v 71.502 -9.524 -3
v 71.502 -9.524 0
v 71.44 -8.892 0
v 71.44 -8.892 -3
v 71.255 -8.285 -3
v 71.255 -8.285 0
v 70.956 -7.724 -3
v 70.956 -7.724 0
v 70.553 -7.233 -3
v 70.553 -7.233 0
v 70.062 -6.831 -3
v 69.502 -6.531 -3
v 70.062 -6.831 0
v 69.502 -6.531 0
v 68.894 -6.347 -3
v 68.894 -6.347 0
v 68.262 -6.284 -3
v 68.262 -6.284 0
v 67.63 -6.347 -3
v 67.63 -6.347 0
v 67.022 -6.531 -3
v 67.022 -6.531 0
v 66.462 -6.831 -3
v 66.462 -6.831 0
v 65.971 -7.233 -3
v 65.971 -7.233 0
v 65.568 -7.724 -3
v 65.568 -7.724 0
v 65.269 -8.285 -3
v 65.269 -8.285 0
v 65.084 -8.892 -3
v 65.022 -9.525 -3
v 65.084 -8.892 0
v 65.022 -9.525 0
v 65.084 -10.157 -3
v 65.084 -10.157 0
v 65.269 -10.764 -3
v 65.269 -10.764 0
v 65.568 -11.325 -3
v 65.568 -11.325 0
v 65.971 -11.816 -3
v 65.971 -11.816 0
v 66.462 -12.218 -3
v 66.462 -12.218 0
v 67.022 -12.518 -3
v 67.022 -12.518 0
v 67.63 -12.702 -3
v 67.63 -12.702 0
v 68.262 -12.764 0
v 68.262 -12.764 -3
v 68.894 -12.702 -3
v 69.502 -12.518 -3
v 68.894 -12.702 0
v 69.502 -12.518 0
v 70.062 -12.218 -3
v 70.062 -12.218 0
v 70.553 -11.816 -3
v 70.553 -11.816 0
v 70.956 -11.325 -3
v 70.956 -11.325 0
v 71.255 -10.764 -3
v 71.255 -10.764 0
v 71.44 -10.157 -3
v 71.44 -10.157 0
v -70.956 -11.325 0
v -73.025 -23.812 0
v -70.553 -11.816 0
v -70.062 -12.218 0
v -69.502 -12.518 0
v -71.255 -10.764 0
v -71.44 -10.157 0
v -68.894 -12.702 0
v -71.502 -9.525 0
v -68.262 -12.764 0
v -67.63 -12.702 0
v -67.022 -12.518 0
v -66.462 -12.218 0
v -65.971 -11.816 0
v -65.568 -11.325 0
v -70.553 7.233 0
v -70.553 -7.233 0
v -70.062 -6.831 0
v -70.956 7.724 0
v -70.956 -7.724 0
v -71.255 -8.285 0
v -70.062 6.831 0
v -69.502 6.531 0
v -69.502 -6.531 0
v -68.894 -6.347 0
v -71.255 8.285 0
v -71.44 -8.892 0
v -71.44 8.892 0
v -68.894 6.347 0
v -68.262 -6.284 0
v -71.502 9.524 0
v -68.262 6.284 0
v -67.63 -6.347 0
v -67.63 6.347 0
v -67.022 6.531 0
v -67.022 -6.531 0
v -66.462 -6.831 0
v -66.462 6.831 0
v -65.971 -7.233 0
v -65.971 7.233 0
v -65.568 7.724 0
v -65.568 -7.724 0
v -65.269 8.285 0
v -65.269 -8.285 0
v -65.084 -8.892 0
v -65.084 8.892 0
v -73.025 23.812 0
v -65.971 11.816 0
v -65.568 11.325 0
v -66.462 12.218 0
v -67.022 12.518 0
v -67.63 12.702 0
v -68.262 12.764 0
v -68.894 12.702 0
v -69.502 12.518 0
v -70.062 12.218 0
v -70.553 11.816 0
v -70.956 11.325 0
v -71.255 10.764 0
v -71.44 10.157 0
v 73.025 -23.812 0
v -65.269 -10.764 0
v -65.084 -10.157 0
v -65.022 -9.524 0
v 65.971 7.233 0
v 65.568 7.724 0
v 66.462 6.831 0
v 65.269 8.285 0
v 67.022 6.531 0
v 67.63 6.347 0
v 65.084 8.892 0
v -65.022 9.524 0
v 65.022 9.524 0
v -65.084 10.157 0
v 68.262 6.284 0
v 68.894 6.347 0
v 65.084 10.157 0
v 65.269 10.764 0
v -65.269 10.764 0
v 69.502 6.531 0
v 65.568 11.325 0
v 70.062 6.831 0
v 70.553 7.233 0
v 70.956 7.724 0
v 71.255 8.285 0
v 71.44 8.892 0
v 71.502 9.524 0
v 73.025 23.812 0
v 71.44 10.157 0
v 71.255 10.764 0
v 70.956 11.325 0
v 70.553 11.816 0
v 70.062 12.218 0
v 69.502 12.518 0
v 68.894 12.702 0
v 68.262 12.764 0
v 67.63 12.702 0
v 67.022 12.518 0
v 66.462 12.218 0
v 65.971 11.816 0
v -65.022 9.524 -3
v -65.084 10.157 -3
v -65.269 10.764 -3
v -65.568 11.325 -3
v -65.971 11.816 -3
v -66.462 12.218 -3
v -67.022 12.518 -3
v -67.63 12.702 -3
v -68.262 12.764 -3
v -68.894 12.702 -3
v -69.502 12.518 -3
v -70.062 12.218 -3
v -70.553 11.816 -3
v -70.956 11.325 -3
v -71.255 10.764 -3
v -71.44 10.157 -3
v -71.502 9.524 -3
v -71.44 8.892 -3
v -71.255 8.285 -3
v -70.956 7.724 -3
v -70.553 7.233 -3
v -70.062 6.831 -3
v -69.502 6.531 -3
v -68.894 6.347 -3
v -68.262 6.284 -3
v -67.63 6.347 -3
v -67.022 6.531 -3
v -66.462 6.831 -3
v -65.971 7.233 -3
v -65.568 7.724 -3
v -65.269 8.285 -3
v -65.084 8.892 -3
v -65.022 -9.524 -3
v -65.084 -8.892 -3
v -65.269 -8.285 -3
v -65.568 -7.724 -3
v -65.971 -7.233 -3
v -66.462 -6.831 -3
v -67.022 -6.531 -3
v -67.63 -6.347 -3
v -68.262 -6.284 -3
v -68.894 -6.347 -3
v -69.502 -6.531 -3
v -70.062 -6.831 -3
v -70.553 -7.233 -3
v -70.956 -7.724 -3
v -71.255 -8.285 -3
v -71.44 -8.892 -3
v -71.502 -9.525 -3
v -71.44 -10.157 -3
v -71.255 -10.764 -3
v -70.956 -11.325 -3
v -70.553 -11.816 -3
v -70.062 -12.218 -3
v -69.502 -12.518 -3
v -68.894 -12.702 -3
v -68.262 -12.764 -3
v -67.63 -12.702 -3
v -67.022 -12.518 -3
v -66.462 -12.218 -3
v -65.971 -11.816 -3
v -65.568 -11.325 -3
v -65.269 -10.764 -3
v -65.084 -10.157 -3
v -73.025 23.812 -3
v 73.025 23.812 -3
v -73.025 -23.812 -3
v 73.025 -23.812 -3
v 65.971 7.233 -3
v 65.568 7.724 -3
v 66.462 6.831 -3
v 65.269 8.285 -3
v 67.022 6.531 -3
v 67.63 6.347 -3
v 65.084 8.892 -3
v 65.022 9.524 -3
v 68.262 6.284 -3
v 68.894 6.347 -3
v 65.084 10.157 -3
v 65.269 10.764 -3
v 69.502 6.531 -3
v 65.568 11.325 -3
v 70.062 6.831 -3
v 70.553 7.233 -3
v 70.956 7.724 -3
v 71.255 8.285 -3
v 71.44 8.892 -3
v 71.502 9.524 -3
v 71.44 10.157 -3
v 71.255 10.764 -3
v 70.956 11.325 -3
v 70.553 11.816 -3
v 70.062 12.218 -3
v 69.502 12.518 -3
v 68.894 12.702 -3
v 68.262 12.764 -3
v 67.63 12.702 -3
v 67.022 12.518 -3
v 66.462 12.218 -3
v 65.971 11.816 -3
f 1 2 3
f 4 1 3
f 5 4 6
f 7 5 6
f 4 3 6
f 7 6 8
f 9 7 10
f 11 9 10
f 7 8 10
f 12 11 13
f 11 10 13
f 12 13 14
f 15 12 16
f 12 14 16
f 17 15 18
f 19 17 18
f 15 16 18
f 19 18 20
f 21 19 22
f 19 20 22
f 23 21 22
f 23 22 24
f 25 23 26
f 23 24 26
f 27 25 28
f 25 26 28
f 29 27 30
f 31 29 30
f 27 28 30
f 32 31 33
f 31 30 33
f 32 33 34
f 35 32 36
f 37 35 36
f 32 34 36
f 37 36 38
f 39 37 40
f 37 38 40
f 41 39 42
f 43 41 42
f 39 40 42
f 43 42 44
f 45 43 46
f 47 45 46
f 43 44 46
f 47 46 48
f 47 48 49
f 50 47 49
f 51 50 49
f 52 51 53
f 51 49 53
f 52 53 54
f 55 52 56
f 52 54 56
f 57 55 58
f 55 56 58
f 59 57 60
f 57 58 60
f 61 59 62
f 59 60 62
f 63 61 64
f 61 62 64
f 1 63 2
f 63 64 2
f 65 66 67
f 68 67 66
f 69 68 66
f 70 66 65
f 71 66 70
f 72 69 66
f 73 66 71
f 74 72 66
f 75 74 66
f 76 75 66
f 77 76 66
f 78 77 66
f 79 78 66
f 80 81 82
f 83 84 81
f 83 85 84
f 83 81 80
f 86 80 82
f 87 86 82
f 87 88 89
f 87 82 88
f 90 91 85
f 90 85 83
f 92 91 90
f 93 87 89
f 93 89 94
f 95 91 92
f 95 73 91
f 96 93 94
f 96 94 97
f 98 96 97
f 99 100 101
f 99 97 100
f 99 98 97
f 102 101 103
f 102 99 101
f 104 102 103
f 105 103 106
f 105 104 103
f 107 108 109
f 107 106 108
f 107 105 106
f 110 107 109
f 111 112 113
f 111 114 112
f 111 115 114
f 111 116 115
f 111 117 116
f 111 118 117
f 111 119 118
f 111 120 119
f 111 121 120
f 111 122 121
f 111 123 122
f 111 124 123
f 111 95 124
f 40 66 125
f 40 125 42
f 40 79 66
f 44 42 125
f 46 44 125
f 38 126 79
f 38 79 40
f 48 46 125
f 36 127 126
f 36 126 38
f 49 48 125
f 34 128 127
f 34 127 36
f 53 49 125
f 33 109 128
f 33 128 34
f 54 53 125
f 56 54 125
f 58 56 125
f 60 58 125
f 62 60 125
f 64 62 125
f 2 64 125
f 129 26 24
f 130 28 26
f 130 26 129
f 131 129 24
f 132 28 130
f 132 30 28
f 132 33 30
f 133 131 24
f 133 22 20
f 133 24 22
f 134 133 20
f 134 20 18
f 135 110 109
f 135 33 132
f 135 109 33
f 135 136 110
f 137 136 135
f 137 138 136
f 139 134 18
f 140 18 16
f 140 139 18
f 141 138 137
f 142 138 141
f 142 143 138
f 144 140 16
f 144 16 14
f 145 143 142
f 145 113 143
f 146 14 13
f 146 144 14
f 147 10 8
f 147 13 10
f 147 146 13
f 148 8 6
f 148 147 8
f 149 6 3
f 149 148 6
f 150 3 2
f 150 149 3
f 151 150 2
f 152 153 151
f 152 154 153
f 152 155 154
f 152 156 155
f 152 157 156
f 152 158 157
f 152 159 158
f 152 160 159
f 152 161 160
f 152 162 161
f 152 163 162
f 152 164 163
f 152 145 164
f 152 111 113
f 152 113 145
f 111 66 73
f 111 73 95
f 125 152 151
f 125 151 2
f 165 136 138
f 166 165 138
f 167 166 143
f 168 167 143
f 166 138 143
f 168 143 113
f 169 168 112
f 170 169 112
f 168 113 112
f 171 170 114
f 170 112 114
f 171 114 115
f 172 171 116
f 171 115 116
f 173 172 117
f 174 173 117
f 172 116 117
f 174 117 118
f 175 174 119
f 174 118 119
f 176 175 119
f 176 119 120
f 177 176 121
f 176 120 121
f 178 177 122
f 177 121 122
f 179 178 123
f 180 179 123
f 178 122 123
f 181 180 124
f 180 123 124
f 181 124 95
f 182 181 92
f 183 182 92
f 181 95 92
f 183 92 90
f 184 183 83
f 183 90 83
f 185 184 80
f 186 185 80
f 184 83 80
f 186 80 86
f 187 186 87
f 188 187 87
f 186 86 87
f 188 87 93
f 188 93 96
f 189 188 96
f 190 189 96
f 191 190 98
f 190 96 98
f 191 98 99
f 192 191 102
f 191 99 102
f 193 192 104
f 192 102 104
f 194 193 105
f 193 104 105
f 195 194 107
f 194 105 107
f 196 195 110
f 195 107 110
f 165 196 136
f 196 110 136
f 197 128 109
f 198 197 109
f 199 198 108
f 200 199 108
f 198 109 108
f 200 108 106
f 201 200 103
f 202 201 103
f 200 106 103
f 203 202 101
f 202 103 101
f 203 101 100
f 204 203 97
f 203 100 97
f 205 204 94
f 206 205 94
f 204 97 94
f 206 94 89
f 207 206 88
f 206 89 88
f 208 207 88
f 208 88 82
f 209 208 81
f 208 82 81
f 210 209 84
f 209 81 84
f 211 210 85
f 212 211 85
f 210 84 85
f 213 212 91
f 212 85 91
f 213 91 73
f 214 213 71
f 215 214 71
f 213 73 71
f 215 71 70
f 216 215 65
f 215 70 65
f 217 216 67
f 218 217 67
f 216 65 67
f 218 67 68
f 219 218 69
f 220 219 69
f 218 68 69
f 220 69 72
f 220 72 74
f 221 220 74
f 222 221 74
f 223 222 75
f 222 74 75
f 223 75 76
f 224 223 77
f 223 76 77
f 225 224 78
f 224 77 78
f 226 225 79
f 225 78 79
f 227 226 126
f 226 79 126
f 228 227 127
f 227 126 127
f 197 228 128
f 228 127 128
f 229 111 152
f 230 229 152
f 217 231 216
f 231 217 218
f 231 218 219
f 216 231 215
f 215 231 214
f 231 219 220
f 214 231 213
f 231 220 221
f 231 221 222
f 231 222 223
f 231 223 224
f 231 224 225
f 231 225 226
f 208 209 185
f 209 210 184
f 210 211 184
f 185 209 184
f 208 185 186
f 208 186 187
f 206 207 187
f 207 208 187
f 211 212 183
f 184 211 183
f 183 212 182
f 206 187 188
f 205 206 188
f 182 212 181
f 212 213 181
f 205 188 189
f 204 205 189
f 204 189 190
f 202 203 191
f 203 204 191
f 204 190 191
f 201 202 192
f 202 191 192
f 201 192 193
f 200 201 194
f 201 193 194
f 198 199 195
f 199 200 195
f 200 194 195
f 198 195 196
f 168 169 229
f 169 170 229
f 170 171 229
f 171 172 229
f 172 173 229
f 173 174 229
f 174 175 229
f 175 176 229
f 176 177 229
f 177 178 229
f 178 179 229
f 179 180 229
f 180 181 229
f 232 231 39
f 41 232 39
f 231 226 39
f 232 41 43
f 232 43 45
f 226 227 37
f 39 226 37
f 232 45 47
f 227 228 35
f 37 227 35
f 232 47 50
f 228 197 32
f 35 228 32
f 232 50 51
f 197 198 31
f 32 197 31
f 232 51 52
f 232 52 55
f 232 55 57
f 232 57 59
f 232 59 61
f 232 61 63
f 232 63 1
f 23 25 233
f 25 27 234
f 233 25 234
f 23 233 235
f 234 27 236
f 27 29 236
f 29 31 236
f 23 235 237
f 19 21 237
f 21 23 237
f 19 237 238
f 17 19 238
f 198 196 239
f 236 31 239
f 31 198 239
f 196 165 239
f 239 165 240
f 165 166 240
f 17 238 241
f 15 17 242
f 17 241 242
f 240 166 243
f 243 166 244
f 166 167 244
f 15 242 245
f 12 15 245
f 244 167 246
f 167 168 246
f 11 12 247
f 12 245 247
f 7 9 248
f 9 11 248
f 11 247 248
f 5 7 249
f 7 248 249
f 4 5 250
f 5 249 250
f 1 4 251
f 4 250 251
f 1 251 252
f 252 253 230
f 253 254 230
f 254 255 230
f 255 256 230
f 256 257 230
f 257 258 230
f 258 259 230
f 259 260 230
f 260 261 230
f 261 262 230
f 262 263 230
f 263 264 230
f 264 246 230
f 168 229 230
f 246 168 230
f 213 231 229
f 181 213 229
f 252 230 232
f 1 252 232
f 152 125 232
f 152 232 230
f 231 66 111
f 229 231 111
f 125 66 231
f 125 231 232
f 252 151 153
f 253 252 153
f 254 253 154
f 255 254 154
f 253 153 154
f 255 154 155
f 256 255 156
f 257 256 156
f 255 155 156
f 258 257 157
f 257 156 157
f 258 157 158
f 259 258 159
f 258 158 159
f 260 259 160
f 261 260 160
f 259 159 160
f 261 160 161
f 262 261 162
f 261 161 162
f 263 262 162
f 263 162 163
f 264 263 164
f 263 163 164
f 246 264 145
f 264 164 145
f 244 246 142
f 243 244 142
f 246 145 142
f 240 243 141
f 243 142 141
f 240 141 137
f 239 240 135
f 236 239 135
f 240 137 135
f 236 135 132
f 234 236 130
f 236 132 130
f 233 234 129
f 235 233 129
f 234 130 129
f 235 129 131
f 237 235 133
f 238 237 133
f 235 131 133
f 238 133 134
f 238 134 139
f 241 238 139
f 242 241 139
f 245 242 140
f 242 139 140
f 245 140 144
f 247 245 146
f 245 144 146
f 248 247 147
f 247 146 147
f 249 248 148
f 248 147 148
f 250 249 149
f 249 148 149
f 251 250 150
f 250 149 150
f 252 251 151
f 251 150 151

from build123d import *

# Parameters (mm, degrees)
F0_W     = 146.05
F0_H     = 47.625
F0_R     = 3.24
F1_DEPTH = 3


# Not quite as in the source:
# - ends of sketch curves that miss each other by under 0.0002 mm in the source are joined


with BuildPart() as f1:
    # F0 (on Top) → F1 (new body)
    with BuildSketch(Plane.XY):
        Rectangle(F0_W, F0_H)
        with Locations((-68.262, -9.5245)):
            Circle(F0_R, mode=Mode.SUBTRACT)
        with Locations((68.262, -9.5245)):
            Circle(F0_R, mode=Mode.SUBTRACT)
        with Locations((-68.262, 9.5245)):
            Circle(F0_R, mode=Mode.SUBTRACT)
        with BuildLine():
            Line((72.225, -15.859485), (72.225, -23.0125))
            Line((72.225, -23.0125), (-72.225, -23.0125))
            Line((-72.225, -23.0125), (-72.225, -15.874133))
            Line((-72.225, -15.874133), (-68.193705, -15.874133))
            ThreePointArc((-68.193705, -15.874133), (-61.912367271, -9.4562050029), (-68.3302949971, -3.174867271))
            Line((-68.3302949971, -3.174867271), (-72.225, -3.174867))
            Line((-72.225, -3.174867), (-72.225, 3.1745))
            Line((-72.225, 3.1745), (-68.262, 3.1745))
            ThreePointArc((-68.262, 3.1745), (-61.912, 9.5245), (-68.262, 15.8745))
            Line((-68.262, 15.8745), (-72.225, 15.8745))
            Line((-72.225, 15.8745), (-72.225, 23.0125))
            Line((-72.225, 23.0125), (72.225, 23.0125))
            Line((72.225, 23.0125), (72.225, 15.8745))
            Line((72.225, 15.8745), (68.262, 15.8745))
            ThreePointArc((68.262, 15.8745), (61.912, 9.5245), (68.262, 3.1745))
            Line((68.262, 3.1745), (72.225, 3.1745))
            Line((72.225, 3.1745), (72.225, -3.189515))
            Line((72.225, -3.189515), (67.825573, -3.189515))
            ThreePointArc((67.825573, -3.189515), (61.9270152731, -9.9609269812), (68.6984269812, -15.8594847269))
            Line((68.6984269812, -15.8594847269), (72.225, -15.859485))
        make_face(mode=Mode.SUBTRACT)
        with Locations((68.262, 9.5245)):
            Circle(F0_R, mode=Mode.SUBTRACT)
        with BuildLine():
            Line((-72.225, -23.0125), (72.225, -23.0125))
            Line((72.225, -23.0125), (72.225, -15.859485))
            Line((72.225, -15.859485), (68.698427, -15.859485))
            ThreePointArc((68.698427, -15.859485), (61.9270152731, -9.9609269812), (67.8255730188, -3.1895152731))
            Line((67.8255730188, -3.1895152731), (72.225, -3.189515))
            Line((72.225, -3.189515), (72.225, 3.1745))
            Line((72.225, 3.1745), (68.262, 3.1745))
            ThreePointArc((68.262, 3.1745), (61.912, 9.5245), (68.262, 15.8745))
            Line((68.262, 15.8745), (72.225, 15.8745))
            Line((72.225, 15.8745), (72.225, 23.0125))
            Line((72.225, 23.0125), (-72.225, 23.0125))
            Line((-72.225, 23.0125), (-72.225, 15.8745))
            Line((-72.225, 15.8745), (-68.262, 15.8745))
            ThreePointArc((-68.262, 15.8745), (-61.912, 9.5245), (-68.262, 3.1745))
            Line((-68.262, 3.1745), (-72.225, 3.1745))
            Line((-72.225, 3.1745), (-72.225, -3.174867))
            Line((-72.225, -3.174867), (-68.330295, -3.174867))
            ThreePointArc((-68.330295, -3.174867), (-61.912367271, -9.4562050029), (-68.1937050029, -15.874132729))
            Line((-68.1937050029, -15.874132729), (-72.225, -15.874133))
            Line((-72.225, -15.874133), (-72.225, -23.0125))
        make_face()
    extrude(amount=-F1_DEPTH)


solid = f1.part
